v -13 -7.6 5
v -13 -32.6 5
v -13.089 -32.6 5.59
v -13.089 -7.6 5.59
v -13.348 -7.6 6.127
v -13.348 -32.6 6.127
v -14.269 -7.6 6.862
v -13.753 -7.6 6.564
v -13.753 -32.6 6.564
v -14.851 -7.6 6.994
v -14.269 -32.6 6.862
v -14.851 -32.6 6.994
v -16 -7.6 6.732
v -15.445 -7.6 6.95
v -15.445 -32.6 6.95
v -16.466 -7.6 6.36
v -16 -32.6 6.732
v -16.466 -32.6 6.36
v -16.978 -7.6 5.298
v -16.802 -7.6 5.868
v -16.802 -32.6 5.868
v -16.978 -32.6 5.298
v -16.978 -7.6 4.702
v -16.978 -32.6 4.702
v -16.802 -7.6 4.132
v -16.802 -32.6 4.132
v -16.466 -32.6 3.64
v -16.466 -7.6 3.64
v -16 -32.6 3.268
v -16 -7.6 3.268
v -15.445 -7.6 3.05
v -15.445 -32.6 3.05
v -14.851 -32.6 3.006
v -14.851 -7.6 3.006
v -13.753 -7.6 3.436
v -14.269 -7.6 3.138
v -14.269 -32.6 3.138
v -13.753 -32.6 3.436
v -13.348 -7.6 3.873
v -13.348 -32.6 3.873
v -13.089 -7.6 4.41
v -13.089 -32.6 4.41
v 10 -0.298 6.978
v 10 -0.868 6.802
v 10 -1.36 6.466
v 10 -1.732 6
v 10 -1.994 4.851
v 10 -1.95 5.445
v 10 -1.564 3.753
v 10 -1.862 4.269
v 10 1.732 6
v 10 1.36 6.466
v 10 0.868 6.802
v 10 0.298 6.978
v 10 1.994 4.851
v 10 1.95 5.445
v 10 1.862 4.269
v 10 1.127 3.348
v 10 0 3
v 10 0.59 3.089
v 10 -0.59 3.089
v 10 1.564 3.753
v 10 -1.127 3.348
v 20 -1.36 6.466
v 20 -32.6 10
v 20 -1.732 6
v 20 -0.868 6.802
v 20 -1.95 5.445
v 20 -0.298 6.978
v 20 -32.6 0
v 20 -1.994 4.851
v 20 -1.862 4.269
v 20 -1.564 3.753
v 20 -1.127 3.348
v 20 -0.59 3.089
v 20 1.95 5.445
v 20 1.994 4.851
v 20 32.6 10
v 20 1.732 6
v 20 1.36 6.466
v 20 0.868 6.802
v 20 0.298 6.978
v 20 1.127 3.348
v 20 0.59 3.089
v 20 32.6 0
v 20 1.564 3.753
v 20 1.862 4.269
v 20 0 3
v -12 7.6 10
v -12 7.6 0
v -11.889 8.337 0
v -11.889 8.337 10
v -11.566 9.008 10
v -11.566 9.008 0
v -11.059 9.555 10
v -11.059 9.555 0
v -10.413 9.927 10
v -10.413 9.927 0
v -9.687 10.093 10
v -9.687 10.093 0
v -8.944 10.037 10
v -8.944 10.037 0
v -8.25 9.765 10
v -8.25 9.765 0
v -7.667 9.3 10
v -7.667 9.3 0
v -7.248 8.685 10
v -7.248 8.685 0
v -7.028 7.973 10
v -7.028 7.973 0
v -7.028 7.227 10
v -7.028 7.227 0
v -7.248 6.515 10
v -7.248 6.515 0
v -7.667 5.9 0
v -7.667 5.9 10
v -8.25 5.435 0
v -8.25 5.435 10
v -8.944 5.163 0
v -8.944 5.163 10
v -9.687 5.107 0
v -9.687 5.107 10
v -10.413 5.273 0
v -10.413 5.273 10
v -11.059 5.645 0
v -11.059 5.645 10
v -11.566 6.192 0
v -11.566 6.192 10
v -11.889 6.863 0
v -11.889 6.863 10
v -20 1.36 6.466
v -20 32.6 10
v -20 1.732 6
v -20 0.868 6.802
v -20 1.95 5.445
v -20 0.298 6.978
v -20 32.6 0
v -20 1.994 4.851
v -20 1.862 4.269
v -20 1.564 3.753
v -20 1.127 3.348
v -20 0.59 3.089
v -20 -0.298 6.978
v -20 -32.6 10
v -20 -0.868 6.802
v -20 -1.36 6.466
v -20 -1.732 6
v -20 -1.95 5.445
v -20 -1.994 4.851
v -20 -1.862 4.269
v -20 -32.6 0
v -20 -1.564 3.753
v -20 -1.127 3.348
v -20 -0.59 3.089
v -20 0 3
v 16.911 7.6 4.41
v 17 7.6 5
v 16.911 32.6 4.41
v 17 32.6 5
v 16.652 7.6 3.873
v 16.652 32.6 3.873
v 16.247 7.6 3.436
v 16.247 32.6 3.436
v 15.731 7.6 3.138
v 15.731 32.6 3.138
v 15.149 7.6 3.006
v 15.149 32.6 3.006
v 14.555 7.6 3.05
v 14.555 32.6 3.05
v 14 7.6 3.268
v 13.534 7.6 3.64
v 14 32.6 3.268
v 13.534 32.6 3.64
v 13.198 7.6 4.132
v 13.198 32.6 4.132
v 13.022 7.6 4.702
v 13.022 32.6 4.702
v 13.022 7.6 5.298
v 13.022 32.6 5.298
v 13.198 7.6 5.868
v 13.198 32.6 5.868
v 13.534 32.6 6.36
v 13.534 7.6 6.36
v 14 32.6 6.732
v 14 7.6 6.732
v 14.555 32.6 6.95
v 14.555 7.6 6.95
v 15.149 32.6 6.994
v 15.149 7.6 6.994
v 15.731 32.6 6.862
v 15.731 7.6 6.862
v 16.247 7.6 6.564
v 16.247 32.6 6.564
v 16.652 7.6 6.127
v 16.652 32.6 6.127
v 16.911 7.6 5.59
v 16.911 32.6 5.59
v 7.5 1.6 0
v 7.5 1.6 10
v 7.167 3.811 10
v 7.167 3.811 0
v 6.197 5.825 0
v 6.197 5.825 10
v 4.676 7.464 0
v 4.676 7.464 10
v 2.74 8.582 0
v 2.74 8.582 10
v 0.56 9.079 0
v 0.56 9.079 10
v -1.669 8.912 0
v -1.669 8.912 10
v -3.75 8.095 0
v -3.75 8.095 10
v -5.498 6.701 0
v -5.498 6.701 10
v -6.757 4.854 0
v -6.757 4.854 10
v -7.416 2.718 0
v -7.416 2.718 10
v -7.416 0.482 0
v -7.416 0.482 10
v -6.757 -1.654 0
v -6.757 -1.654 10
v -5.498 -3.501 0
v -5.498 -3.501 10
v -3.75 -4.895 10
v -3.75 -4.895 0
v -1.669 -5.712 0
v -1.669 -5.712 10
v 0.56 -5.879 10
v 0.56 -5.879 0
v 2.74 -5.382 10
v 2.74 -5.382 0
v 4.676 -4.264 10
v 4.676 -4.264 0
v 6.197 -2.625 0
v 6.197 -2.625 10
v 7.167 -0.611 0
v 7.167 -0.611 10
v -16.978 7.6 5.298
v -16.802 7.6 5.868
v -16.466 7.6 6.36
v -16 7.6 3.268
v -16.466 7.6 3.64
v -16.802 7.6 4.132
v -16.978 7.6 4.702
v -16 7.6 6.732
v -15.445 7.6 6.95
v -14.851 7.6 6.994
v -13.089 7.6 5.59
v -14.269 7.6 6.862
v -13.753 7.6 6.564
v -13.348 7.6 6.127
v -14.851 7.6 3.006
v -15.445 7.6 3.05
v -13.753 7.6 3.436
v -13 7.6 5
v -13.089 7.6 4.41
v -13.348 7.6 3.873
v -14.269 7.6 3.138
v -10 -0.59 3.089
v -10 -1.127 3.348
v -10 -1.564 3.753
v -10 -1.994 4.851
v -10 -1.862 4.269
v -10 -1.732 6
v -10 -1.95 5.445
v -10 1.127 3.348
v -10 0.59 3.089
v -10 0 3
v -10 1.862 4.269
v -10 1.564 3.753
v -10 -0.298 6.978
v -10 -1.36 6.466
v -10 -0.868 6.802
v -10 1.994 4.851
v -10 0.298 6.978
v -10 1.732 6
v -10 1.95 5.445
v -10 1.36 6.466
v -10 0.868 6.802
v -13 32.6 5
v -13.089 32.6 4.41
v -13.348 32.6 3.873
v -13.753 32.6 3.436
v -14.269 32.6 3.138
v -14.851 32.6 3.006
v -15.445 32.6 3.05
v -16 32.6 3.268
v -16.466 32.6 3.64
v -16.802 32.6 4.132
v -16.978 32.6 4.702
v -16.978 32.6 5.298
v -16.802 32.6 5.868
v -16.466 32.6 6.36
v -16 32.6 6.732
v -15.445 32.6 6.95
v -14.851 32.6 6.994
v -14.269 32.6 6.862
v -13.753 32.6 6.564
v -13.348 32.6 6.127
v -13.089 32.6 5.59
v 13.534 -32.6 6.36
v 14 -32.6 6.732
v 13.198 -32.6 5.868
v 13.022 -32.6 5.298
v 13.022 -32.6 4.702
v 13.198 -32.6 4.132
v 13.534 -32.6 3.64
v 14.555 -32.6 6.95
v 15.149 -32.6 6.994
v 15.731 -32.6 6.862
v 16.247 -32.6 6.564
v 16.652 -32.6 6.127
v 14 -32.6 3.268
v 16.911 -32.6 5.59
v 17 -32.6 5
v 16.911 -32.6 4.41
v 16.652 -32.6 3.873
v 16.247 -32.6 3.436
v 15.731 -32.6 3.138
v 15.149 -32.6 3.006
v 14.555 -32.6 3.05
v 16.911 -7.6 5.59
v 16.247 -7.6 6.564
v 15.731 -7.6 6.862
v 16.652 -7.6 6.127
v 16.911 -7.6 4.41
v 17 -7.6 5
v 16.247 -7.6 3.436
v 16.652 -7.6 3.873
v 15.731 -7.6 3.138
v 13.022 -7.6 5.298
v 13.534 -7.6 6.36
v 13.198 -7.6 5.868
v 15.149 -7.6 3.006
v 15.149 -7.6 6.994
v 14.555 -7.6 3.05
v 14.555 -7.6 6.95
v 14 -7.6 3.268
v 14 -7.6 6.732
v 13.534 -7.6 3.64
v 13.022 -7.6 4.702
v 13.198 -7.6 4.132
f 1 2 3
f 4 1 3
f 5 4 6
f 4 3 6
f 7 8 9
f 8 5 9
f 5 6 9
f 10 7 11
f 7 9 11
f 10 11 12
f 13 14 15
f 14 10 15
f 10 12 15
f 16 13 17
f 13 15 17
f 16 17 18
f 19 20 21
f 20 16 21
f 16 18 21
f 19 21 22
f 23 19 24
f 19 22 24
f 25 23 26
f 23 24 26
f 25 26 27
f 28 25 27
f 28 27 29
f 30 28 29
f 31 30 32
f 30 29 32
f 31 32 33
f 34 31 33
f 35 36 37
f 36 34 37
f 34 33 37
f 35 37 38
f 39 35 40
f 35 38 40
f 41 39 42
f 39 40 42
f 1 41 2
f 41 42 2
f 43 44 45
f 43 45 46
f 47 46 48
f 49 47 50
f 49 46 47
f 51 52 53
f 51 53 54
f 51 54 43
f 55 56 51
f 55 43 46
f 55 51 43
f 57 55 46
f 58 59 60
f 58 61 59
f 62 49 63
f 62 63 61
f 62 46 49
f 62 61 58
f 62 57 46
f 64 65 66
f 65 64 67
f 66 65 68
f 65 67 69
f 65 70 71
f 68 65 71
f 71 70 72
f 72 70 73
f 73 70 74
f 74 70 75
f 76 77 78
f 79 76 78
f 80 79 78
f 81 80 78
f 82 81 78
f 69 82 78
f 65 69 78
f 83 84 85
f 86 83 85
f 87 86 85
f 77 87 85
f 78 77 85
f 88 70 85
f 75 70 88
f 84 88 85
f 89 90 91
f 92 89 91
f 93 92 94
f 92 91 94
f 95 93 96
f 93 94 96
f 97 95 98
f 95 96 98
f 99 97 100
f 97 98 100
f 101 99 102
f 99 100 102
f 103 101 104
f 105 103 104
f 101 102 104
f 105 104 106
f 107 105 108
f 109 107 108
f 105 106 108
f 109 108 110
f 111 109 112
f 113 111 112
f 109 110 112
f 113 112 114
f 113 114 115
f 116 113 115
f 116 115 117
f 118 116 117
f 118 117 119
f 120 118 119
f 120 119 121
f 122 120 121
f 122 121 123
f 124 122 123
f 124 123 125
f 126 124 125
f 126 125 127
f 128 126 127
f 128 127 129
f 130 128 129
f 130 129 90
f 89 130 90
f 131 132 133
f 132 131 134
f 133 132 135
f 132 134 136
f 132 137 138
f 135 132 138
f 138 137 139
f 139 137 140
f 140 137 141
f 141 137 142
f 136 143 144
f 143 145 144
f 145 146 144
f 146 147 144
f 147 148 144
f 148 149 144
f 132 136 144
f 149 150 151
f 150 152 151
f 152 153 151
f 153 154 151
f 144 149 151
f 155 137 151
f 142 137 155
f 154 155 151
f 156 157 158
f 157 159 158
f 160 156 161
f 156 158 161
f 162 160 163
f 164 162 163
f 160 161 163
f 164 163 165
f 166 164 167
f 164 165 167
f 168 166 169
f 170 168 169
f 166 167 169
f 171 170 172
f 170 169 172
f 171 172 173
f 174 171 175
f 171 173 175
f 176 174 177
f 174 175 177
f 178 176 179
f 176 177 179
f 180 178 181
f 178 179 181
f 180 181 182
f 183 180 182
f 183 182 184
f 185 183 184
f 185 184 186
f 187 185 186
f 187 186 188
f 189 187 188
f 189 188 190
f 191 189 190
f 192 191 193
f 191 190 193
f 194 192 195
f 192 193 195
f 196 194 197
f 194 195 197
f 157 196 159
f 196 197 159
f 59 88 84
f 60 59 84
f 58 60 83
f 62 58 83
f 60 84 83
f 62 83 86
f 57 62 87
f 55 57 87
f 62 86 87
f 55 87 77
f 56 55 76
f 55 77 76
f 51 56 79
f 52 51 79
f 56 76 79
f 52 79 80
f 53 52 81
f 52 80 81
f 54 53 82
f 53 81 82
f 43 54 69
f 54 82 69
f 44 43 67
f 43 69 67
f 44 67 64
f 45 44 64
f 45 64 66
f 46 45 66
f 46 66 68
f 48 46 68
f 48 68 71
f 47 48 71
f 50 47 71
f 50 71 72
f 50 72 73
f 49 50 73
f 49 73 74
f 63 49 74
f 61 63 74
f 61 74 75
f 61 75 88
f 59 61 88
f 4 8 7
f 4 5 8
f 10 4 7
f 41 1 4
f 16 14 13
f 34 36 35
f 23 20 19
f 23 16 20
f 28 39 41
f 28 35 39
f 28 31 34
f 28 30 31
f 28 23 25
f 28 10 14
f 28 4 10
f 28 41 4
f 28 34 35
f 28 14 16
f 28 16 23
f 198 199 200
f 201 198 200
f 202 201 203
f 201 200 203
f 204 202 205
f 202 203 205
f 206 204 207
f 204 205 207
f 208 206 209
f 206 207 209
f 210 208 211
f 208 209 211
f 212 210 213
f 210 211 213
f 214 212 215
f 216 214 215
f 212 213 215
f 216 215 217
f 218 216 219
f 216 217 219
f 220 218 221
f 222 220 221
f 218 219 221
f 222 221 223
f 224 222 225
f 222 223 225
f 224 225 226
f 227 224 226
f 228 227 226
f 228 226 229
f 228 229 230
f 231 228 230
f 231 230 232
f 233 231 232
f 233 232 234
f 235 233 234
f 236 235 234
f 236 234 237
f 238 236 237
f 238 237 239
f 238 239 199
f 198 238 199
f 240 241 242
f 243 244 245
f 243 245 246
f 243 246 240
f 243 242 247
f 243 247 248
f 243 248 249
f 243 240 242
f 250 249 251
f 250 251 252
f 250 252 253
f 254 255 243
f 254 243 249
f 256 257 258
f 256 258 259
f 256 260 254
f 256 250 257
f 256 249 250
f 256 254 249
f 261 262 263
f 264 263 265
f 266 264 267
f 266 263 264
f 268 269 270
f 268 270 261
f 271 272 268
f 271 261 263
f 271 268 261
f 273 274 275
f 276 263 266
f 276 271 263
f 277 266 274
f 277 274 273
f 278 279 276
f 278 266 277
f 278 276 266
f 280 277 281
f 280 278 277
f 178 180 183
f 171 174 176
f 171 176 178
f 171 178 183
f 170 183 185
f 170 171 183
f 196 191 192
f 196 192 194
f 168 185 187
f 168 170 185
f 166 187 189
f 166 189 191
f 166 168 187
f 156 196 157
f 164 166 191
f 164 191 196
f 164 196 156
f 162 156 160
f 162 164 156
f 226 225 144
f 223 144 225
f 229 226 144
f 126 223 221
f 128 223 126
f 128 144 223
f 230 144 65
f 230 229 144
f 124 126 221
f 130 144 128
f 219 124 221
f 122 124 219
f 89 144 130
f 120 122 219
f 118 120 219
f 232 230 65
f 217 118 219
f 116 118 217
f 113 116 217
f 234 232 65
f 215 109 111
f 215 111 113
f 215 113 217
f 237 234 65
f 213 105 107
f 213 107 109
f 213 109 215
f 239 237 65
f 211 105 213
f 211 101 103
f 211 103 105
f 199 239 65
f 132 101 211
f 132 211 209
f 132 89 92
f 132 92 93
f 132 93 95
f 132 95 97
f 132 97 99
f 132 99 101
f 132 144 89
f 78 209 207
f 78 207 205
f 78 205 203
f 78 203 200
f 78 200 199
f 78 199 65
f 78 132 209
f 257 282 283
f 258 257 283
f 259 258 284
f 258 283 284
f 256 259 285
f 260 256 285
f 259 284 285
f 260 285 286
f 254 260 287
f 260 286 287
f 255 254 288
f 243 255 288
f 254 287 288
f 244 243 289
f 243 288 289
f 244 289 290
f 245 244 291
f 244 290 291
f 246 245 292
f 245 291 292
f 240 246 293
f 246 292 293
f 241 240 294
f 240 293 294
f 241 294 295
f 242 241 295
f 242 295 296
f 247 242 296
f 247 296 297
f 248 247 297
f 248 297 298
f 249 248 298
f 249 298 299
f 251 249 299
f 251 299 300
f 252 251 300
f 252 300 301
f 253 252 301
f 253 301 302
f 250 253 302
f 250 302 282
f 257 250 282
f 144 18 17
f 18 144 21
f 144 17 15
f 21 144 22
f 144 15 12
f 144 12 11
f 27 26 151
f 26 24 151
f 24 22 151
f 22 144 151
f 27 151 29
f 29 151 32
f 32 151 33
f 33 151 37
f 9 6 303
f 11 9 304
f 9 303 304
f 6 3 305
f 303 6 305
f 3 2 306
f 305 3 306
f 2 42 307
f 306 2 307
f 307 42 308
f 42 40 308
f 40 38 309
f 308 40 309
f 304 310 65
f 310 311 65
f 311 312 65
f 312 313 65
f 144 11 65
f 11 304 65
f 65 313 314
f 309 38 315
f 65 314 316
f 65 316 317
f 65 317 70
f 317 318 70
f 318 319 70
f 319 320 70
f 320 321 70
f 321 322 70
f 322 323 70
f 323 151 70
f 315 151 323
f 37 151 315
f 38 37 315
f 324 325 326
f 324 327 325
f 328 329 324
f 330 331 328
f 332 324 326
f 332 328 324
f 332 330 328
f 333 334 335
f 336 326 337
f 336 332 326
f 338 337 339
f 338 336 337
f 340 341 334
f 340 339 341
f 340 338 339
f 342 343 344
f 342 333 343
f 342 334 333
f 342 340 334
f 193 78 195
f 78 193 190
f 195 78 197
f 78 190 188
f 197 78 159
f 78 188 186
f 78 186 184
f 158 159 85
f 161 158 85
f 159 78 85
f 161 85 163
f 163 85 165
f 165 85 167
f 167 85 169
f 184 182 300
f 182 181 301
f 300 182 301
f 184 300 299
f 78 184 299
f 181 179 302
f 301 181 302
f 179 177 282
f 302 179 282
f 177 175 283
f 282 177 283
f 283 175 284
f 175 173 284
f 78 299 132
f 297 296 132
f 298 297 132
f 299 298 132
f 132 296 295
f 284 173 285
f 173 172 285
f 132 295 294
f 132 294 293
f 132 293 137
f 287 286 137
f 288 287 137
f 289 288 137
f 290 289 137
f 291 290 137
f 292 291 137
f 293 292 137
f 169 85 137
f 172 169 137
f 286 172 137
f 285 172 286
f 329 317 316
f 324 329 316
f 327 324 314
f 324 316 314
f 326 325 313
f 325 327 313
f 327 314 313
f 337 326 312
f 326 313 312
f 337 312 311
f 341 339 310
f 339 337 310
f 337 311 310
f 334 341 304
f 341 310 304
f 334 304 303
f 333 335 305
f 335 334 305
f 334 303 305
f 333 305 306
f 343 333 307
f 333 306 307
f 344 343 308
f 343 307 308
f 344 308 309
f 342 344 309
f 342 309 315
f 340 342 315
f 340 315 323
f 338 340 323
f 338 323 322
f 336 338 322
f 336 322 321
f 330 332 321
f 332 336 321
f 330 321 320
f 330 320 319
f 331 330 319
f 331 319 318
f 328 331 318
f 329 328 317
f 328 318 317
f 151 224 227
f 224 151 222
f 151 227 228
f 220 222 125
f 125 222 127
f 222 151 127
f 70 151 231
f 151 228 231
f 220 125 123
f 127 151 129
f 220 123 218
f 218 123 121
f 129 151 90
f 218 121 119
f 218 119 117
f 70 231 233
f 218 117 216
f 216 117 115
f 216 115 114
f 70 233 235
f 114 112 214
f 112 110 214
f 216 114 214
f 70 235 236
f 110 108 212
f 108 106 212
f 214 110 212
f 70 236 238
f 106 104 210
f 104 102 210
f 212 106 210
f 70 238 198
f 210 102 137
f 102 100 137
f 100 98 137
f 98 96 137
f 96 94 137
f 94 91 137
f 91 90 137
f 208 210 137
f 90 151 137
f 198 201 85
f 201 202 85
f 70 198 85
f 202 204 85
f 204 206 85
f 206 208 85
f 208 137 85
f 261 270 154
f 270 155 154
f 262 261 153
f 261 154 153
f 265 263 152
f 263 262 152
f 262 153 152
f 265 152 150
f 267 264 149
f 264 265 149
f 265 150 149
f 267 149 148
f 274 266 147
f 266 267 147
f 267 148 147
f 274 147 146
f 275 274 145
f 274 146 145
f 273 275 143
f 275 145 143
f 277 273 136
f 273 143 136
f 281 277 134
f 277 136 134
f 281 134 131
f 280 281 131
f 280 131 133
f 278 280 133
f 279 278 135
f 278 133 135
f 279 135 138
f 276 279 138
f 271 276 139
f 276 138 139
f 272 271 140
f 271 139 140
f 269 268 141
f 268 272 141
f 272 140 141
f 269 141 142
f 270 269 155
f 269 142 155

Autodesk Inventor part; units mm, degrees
ref_plane "YZ Plane" through (0, 0, 0) normal (1, 0, 0) x (0, 1, 0)
ref_plane "XZ Plane" through (0, 0, 0) normal (0, 1, 0) x (-1, 0, 0)
ref_plane "XY Plane" through (0, 0, 0) normal (0, 0, 1) x (1, 0, 0)
sketch "Sketch1" plane through (0, 0, 0) normal (0, 0, 1) x (1, 0, 0)
  line L0 (-20, -32.6) -> (20, -32.6)
  line L1 (20, -32.6) -> (20, 32.6)
  line L2 (20, 32.6) -> (-20, 32.6)
  line L3 (-20, 32.6) -> (-20, -32.6)
  line L4 (-20, -32.6) -> (20, 32.6) construction
  line L5 (20, -32.6) -> (-20, 32.6) construction
  point P0 (0, 0)
  dimension "d0" = 40
  dimension "d1" = 65.2
extrude "Extrusion1" add sketch "Sketch1" along normal blind 10
sketch "Sketch2" plane through (-20, 32.6, 0) normal (0, 1, 0) x (1, 0, 0)
  line L0 (40, -10) -> (40, -5)
  line L1 (40, 0) -> (40, -10) projected
  line L2 (40, -5) -> (35, -5)
  circle A0 centre (35, -5) radius 2
  line L3 (20, 0) -> (20, -10)
  circle A1 centre (5, -5) radius 2
  dimension "d4" = 5
  dimension "d5" = 5
  dimension "d6" = 4
extrude "Extrusion2" cut sketch "Sketch2" against normal blind 25
mirror "Mirror1" about plane through (0, 0, 0) normal (0, 1, 0) of "Extrusion2"
thread "Thread1" size "M4x0.7" class "6H" standard "ANSI Metric M Profile" full length
thread "Thread2" size "M4x0.7" class "6H" standard "ANSI Metric M Profile" full length
thread "Thread3" size "M4x0.7" class "6H" standard "ANSI Metric M Profile" full length
thread "Thread4" size "M4x0.7" class "6H" standard "ANSI Metric M Profile" full length
sketch "Sketch3" plane through (20, -32.6, 0) normal (1, 0, 0) x (0, 0, -1)
  line L0 (0, 32.6) -> (-5, 32.6)
  circle A0 centre (-5, 32.6) radius 2
  dimension "d17" = 5
  dimension "d18" = 4
extrude "Extrusion3" cut sketch "Sketch3" against normal blind 10
mirror "Mirror2" about plane through (0, 0, 0) normal (1, 0, 0) of "Extrusion3"
sketch "Sketch4" plane through (0, 0, 10) normal (0, 0, 1) x (1, 0, 0)
  point P0 (0, 0)
sketch "Sketch5" plane through (0, 0, 10) normal (0, 0, 1) x (1, 0, 0)
  line L0 (-20, -32.6) -> (20, -32.6) projected
  line L1 (0, -32.6) -> (0, 1.6)
  circle A0 centre (0, 1.6) radius 7.5
  line L2 (0, 1.6) -> (13, 1.6)
  point P0 (0, 0)
  dimension "d21" = 34.2
  dimension "d22" = 15
thread "Thread5" size "M4x0.7" class "6H" standard "ANSI Metric M Profile" full length
thread "Thread6" size "M4x0.7" class "6H" standard "ANSI Metric M Profile" full length
extrude "Extrusion6" cut sketch "Sketch5" against normal blind 10
sketch "Sketch6" plane through (0, 0, 10) normal (0, 0, 1) x (1, 0, 0)
  circle A0 centre (13, 6.6) radius 3.75 projected
sketch "Boceto7" plane through (0, 0, 0) normal (0, 0, -1) x (-1, 0, 0)
  circle A0 centre (0, 1.6) radius 3.9163
  circle A1 centre (0, 1.6) radius 7.5 projected
  line L0 (0, 1.6) -> (9.5, 1.6)
  line L1 (9.5, 1.6) -> (9.5, 7.6)
  circle A2 centre (9.5, 7.6) radius 2.5
  point P0 (0, 0)
  dimension "d38" = 9.5
  dimension "d39" = 6
  dimension "d40" = 5
extrude "Extrusión7" cut sketch "Boceto7" against normal blind 10 contours A2
sketch "Boceto8" plane through (0, 0, 10) normal (0, 0, 1) x (1, 0, 0)
  circle A0 centre (-9.5, 7.6) radius 2.5 projected
sketch "Boceto9" plane through (0, 0, 0) normal (0, 0, -1) x (-1, 0, 0)
  circle A0 centre (9.5, 7.6) radius 2.5 projected
sketch "Boceto10" plane through (0, 0, 10) normal (0, 0, 1) x (1, 0, 0)
  circle A0 centre (-9.5, 7.6) radius 2.5 projected
sketch "Boceto11" plane through (0, 0, 0) normal (0, 0, -1) x (-1, 0, 0)
  circle A0 centre (9.5, 7.6) radius 2.5 projected
properties part number "Rb PEEK - Corto con ventana"
